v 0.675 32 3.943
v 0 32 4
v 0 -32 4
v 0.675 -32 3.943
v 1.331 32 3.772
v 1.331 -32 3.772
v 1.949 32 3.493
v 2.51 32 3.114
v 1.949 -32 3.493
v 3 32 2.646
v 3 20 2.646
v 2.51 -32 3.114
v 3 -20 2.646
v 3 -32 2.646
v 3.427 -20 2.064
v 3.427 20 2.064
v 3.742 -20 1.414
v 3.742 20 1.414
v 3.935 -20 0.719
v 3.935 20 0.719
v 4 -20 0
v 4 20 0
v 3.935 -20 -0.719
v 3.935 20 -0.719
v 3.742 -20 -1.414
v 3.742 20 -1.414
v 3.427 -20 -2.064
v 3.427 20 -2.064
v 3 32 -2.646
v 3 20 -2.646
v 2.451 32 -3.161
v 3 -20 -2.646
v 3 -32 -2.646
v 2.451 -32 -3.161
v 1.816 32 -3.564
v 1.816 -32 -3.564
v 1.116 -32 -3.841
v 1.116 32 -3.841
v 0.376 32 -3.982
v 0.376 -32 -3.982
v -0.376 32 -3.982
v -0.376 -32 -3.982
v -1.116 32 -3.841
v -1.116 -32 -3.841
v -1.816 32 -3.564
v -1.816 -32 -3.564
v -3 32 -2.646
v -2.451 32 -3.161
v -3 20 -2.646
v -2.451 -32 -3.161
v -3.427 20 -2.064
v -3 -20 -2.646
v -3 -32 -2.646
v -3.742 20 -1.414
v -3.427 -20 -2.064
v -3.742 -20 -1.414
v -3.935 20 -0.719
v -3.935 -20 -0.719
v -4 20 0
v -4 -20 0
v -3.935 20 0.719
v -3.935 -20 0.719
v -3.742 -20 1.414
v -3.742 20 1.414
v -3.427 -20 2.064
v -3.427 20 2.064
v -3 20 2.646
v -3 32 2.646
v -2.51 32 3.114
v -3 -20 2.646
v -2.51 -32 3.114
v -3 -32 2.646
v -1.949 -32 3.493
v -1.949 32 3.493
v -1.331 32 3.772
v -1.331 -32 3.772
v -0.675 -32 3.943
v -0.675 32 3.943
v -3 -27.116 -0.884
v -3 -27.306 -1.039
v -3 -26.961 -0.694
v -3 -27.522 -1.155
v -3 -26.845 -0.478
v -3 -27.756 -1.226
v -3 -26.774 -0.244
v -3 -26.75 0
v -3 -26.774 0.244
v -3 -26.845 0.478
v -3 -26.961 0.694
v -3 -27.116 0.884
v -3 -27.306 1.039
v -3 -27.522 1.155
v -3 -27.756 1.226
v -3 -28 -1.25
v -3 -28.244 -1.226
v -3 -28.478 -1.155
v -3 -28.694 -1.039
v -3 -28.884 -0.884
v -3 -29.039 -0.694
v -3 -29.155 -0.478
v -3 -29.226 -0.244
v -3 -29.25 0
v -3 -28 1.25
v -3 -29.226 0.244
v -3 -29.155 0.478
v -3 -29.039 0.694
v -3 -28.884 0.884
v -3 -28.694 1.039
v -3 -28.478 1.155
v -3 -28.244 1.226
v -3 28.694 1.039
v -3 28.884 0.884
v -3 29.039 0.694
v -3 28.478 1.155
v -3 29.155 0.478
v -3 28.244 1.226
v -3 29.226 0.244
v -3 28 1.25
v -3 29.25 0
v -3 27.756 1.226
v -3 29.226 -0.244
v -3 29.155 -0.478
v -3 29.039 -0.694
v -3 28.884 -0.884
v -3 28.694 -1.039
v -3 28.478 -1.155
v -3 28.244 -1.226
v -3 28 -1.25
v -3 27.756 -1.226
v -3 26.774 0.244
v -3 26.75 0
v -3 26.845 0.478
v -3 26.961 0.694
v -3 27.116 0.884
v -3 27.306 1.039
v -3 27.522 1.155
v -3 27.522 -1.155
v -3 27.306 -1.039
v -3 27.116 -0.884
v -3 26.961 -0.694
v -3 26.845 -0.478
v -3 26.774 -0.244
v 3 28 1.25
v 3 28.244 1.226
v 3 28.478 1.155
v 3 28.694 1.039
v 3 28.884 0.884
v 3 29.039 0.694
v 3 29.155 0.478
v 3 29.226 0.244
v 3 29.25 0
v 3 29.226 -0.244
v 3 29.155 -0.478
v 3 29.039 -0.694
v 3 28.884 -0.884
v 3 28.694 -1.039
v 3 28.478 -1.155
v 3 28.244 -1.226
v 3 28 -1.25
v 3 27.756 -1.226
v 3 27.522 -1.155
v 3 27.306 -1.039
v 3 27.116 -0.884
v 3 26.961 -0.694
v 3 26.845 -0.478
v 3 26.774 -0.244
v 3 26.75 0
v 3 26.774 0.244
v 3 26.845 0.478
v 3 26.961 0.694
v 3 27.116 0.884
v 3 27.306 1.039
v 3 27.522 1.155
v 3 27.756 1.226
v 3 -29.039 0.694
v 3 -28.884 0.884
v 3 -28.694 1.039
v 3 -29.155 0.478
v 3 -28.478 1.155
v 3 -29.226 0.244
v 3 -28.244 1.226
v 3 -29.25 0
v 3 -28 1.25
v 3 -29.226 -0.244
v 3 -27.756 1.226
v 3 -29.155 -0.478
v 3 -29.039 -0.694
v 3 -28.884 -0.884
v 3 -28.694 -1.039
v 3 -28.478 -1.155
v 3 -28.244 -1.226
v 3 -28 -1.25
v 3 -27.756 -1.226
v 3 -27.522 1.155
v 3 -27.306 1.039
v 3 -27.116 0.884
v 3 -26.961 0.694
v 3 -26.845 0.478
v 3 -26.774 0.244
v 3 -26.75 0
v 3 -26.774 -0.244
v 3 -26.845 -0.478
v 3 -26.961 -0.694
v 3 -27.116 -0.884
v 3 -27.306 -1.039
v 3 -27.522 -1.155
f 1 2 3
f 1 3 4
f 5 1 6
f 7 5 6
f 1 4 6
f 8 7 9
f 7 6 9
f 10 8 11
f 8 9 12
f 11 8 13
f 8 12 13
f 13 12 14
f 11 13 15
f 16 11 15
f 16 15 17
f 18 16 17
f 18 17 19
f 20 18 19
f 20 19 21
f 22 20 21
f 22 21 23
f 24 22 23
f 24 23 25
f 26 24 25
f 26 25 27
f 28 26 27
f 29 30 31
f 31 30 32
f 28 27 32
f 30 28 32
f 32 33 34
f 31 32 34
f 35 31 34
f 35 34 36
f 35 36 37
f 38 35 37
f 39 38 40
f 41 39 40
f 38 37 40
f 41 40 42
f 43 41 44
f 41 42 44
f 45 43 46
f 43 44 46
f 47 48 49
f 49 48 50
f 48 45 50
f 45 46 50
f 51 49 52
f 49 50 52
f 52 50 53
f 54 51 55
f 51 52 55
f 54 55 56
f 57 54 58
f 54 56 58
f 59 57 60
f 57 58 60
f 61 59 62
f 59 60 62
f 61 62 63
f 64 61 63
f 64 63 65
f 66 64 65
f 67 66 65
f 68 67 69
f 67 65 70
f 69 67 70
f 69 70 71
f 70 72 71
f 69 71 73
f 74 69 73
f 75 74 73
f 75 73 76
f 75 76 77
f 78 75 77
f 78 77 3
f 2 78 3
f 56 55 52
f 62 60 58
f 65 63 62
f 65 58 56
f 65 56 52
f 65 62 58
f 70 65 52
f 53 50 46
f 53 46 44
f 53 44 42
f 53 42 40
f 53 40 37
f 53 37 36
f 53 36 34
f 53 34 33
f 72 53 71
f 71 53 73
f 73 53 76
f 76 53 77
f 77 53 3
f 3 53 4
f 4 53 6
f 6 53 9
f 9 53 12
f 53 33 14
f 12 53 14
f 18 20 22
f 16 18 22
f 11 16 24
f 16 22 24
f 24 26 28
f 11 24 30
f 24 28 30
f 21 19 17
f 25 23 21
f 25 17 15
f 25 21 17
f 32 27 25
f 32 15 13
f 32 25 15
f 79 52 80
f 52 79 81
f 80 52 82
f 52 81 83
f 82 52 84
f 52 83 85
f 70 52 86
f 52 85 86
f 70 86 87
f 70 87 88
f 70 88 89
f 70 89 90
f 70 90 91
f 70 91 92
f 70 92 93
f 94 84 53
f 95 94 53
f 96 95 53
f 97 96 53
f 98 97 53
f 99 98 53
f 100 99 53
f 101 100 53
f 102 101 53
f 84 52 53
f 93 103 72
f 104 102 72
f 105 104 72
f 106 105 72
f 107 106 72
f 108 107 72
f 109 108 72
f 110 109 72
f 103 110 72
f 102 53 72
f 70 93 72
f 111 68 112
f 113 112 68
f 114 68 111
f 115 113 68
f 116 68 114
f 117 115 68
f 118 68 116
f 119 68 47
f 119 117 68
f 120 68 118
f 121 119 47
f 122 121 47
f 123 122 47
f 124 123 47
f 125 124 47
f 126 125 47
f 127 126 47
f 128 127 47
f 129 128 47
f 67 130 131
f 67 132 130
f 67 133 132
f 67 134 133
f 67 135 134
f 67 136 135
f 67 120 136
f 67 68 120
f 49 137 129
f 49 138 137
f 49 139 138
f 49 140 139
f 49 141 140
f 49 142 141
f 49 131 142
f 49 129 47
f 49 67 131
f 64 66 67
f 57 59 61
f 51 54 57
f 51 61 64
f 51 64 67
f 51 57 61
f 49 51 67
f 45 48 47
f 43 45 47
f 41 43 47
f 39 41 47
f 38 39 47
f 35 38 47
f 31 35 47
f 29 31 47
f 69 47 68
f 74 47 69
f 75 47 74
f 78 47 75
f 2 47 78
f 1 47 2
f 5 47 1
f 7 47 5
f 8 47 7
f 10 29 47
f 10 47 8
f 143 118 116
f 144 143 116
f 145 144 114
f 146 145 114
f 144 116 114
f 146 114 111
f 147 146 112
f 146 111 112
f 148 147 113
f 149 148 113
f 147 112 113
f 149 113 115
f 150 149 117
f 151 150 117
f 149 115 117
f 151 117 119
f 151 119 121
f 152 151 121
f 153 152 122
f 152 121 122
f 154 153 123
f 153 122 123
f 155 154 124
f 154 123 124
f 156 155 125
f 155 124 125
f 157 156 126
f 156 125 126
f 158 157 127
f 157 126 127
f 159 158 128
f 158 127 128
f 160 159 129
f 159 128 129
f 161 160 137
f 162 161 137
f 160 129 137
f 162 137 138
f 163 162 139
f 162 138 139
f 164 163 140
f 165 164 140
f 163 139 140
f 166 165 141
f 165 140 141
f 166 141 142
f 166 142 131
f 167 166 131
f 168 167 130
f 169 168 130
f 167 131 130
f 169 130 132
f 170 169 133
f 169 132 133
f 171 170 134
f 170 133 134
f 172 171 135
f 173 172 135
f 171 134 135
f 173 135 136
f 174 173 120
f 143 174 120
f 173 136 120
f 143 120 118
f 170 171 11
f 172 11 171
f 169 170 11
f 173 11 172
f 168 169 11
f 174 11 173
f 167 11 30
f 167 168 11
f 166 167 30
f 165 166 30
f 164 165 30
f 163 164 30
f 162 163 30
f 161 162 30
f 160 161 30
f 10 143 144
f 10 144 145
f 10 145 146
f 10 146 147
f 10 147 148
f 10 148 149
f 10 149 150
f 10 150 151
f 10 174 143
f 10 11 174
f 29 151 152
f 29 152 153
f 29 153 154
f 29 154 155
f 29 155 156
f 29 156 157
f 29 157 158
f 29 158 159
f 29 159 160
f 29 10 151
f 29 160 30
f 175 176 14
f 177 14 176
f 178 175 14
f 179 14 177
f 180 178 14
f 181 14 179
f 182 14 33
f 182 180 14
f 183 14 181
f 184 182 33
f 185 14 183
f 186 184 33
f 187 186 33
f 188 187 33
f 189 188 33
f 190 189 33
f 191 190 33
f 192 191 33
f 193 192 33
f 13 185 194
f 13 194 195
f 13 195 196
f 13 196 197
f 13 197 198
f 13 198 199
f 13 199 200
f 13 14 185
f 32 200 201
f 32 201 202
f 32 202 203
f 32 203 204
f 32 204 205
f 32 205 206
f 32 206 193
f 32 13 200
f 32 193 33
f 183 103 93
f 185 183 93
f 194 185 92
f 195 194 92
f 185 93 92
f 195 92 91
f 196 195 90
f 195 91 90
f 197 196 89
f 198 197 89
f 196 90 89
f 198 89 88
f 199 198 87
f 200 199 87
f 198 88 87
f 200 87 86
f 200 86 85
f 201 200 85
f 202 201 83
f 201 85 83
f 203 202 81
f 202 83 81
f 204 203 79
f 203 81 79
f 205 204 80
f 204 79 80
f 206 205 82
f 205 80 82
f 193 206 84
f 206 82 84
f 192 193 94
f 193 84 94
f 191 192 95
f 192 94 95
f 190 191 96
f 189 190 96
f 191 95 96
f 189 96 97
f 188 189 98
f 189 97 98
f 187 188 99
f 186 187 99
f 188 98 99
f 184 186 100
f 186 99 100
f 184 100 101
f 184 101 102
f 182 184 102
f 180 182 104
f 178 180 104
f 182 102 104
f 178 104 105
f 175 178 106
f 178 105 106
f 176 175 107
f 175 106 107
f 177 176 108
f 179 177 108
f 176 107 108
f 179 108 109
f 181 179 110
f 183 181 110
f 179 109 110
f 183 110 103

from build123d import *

# Parameters (mm, degrees)
EXTRUDE_1_DEPTH              = 32
EXTRUDE_1_DEPTH_BACK         = 32
SKETCH_1_R                   = 4
HOLE_WIZARD_M3_2_D           = 2.5
HOLE_WIZARD_M3_2_CSINK_D     = 3.05
HOLE_WIZARD_M3_2_CSINK_ANGLE = 90
SKETCH_18_W                  = 33.250745193
SKETCH_18_H                  = 19.055234746
SKETCH_18_W_2                = 46.103437085
SKETCH_18_H_2                = 35.552719861
CUT_EXTRUDE_1_DEPTH          = 7
CUT_EXTRUDE_2_DEPTH          = 12
CUT_EXTRUDE_START            = -12
CUT_EXTRUDE_3_DEPTH          = 12


with BuildPart() as part:
    # 草图1 → 凸台-拉伸1 (new, two sides: drawn at the far end of the back side and taken through both)
    with BuildSketch(Plane(origin=(0, 0, 0), x_dir=(1, 0, 0), z_dir=(0, 1, 0)).offset(-EXTRUDE_1_DEPTH_BACK)):
        Circle(SKETCH_1_R)
    extrude(amount=EXTRUDE_1_DEPTH + EXTRUDE_1_DEPTH_BACK)

    # M3 螺纹孔2 (through all)
    with Locations(Plane(origin=(10, 0, 0), x_dir=(0, 0, -1), z_dir=(1, 0, 0))):
        with Locations((0, 28), (0, -28)):
            CounterSinkHole(HOLE_WIZARD_M3_2_D / 2, HOLE_WIZARD_M3_2_CSINK_D / 2, counter_sink_angle=HOLE_WIZARD_M3_2_CSINK_ANGLE)

    # 草图18 → 切除-拉伸1 (cut)
    with BuildSketch(Plane(origin=(10, 0, 0), x_dir=(0, 0, -1), z_dir=(1, 0, 0))):
        with Locations((-0.619455311, 29.527617373)):
            Rectangle(SKETCH_18_W, SKETCH_18_H)
        with Locations((-0.267764737, -37.77635993)):
            Rectangle(SKETCH_18_W_2, SKETCH_18_H_2)
    extrude(amount=-CUT_EXTRUDE_1_DEPTH, mode=Mode.SUBTRACT)

    # 草图19 → 切除-拉伸2 (cut)
    with BuildSketch(Plane.XZ.offset(32)):
        with BuildLine():
            Line((3, -2.645751311), (3, 2.645751311))
            ThreePointArc((3, 2.645751311), (4, 0), (3, -2.645751311))
        make_face()
        with BuildLine():
            Line((-3, -2.645751311), (-3, 2.645751311))
            ThreePointArc((-3, 2.645751311), (-4, 0), (-3, -2.645751311))
        make_face()
    extrude(amount=-CUT_EXTRUDE_2_DEPTH, mode=Mode.SUBTRACT)

    # 草图20 → 切除-拉伸3 (cut)
    with BuildSketch(Plane(origin=(0, 32, 0), x_dir=(1, 0, 0), z_dir=(0, 1, 0)).offset(CUT_EXTRUDE_START)):
        with BuildLine():
            Line((3, -2.645751311), (3, 2.645751311))
            ThreePointArc((3, 2.645751311), (4, 0), (3, -2.645751311))
        make_face()
        with BuildLine():
            Line((-3, -2.645751311), (-3, 2.645751311))
            ThreePointArc((-3, 2.645751311), (-4, 0), (-3, -2.645751311))
        make_face()
    extrude(amount=CUT_EXTRUDE_3_DEPTH, mode=Mode.SUBTRACT)


solid = part.part
